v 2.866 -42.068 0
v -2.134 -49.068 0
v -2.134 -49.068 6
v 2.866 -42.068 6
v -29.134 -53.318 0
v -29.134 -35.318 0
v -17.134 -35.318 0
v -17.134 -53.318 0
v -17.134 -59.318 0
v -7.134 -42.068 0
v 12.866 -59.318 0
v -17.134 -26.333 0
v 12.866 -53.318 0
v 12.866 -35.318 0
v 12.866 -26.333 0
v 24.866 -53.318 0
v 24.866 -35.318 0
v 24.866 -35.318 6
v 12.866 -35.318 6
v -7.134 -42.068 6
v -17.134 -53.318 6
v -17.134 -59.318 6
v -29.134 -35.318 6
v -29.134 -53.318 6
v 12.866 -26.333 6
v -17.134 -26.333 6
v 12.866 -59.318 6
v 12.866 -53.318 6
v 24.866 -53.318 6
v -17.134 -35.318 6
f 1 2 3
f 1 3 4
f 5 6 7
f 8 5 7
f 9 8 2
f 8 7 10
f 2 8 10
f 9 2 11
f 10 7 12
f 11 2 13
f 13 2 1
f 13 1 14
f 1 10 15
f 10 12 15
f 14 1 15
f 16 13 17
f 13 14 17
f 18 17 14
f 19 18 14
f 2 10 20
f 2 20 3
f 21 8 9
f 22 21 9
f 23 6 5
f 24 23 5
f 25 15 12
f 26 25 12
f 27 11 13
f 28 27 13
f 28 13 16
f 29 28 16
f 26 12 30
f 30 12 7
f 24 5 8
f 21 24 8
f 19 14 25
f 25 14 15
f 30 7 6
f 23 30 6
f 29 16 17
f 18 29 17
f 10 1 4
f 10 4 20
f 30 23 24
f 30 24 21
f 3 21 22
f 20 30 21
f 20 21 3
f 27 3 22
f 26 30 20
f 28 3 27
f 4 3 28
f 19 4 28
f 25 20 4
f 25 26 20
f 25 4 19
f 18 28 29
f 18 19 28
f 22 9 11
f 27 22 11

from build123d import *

# Parameters (mm, degrees)
BOSS_EXTRUDE1_DEPTH = 6


with BuildPart() as part:
    # Sketch1 → Boss-Extrude1 (new body)
    with BuildSketch(Plane.XY):
        Polygon((24.866162055, -35.317756725), (12.866162055, -35.317756725), (12.866162055, -26.332846246), (-17.133837945, -26.332846246), (-17.133837945, -35.317756725), (-29.133837945, -35.317756725), (-29.133837945, -53.317756725), (-17.133837945, -53.317756725), (-17.133837945, -59.317756725), (12.866162055, -59.317756725), (12.866162055, -53.317756725), (24.866162055, -53.317756725), align=None)
        Polygon((-7.133837945, -42.067756725), (-2.133837945, -49.067756725), (2.866162055, -42.067756725), align=None, mode=Mode.SUBTRACT)
    extrude(amount=BOSS_EXTRUDE1_DEPTH)


solid = part.part
